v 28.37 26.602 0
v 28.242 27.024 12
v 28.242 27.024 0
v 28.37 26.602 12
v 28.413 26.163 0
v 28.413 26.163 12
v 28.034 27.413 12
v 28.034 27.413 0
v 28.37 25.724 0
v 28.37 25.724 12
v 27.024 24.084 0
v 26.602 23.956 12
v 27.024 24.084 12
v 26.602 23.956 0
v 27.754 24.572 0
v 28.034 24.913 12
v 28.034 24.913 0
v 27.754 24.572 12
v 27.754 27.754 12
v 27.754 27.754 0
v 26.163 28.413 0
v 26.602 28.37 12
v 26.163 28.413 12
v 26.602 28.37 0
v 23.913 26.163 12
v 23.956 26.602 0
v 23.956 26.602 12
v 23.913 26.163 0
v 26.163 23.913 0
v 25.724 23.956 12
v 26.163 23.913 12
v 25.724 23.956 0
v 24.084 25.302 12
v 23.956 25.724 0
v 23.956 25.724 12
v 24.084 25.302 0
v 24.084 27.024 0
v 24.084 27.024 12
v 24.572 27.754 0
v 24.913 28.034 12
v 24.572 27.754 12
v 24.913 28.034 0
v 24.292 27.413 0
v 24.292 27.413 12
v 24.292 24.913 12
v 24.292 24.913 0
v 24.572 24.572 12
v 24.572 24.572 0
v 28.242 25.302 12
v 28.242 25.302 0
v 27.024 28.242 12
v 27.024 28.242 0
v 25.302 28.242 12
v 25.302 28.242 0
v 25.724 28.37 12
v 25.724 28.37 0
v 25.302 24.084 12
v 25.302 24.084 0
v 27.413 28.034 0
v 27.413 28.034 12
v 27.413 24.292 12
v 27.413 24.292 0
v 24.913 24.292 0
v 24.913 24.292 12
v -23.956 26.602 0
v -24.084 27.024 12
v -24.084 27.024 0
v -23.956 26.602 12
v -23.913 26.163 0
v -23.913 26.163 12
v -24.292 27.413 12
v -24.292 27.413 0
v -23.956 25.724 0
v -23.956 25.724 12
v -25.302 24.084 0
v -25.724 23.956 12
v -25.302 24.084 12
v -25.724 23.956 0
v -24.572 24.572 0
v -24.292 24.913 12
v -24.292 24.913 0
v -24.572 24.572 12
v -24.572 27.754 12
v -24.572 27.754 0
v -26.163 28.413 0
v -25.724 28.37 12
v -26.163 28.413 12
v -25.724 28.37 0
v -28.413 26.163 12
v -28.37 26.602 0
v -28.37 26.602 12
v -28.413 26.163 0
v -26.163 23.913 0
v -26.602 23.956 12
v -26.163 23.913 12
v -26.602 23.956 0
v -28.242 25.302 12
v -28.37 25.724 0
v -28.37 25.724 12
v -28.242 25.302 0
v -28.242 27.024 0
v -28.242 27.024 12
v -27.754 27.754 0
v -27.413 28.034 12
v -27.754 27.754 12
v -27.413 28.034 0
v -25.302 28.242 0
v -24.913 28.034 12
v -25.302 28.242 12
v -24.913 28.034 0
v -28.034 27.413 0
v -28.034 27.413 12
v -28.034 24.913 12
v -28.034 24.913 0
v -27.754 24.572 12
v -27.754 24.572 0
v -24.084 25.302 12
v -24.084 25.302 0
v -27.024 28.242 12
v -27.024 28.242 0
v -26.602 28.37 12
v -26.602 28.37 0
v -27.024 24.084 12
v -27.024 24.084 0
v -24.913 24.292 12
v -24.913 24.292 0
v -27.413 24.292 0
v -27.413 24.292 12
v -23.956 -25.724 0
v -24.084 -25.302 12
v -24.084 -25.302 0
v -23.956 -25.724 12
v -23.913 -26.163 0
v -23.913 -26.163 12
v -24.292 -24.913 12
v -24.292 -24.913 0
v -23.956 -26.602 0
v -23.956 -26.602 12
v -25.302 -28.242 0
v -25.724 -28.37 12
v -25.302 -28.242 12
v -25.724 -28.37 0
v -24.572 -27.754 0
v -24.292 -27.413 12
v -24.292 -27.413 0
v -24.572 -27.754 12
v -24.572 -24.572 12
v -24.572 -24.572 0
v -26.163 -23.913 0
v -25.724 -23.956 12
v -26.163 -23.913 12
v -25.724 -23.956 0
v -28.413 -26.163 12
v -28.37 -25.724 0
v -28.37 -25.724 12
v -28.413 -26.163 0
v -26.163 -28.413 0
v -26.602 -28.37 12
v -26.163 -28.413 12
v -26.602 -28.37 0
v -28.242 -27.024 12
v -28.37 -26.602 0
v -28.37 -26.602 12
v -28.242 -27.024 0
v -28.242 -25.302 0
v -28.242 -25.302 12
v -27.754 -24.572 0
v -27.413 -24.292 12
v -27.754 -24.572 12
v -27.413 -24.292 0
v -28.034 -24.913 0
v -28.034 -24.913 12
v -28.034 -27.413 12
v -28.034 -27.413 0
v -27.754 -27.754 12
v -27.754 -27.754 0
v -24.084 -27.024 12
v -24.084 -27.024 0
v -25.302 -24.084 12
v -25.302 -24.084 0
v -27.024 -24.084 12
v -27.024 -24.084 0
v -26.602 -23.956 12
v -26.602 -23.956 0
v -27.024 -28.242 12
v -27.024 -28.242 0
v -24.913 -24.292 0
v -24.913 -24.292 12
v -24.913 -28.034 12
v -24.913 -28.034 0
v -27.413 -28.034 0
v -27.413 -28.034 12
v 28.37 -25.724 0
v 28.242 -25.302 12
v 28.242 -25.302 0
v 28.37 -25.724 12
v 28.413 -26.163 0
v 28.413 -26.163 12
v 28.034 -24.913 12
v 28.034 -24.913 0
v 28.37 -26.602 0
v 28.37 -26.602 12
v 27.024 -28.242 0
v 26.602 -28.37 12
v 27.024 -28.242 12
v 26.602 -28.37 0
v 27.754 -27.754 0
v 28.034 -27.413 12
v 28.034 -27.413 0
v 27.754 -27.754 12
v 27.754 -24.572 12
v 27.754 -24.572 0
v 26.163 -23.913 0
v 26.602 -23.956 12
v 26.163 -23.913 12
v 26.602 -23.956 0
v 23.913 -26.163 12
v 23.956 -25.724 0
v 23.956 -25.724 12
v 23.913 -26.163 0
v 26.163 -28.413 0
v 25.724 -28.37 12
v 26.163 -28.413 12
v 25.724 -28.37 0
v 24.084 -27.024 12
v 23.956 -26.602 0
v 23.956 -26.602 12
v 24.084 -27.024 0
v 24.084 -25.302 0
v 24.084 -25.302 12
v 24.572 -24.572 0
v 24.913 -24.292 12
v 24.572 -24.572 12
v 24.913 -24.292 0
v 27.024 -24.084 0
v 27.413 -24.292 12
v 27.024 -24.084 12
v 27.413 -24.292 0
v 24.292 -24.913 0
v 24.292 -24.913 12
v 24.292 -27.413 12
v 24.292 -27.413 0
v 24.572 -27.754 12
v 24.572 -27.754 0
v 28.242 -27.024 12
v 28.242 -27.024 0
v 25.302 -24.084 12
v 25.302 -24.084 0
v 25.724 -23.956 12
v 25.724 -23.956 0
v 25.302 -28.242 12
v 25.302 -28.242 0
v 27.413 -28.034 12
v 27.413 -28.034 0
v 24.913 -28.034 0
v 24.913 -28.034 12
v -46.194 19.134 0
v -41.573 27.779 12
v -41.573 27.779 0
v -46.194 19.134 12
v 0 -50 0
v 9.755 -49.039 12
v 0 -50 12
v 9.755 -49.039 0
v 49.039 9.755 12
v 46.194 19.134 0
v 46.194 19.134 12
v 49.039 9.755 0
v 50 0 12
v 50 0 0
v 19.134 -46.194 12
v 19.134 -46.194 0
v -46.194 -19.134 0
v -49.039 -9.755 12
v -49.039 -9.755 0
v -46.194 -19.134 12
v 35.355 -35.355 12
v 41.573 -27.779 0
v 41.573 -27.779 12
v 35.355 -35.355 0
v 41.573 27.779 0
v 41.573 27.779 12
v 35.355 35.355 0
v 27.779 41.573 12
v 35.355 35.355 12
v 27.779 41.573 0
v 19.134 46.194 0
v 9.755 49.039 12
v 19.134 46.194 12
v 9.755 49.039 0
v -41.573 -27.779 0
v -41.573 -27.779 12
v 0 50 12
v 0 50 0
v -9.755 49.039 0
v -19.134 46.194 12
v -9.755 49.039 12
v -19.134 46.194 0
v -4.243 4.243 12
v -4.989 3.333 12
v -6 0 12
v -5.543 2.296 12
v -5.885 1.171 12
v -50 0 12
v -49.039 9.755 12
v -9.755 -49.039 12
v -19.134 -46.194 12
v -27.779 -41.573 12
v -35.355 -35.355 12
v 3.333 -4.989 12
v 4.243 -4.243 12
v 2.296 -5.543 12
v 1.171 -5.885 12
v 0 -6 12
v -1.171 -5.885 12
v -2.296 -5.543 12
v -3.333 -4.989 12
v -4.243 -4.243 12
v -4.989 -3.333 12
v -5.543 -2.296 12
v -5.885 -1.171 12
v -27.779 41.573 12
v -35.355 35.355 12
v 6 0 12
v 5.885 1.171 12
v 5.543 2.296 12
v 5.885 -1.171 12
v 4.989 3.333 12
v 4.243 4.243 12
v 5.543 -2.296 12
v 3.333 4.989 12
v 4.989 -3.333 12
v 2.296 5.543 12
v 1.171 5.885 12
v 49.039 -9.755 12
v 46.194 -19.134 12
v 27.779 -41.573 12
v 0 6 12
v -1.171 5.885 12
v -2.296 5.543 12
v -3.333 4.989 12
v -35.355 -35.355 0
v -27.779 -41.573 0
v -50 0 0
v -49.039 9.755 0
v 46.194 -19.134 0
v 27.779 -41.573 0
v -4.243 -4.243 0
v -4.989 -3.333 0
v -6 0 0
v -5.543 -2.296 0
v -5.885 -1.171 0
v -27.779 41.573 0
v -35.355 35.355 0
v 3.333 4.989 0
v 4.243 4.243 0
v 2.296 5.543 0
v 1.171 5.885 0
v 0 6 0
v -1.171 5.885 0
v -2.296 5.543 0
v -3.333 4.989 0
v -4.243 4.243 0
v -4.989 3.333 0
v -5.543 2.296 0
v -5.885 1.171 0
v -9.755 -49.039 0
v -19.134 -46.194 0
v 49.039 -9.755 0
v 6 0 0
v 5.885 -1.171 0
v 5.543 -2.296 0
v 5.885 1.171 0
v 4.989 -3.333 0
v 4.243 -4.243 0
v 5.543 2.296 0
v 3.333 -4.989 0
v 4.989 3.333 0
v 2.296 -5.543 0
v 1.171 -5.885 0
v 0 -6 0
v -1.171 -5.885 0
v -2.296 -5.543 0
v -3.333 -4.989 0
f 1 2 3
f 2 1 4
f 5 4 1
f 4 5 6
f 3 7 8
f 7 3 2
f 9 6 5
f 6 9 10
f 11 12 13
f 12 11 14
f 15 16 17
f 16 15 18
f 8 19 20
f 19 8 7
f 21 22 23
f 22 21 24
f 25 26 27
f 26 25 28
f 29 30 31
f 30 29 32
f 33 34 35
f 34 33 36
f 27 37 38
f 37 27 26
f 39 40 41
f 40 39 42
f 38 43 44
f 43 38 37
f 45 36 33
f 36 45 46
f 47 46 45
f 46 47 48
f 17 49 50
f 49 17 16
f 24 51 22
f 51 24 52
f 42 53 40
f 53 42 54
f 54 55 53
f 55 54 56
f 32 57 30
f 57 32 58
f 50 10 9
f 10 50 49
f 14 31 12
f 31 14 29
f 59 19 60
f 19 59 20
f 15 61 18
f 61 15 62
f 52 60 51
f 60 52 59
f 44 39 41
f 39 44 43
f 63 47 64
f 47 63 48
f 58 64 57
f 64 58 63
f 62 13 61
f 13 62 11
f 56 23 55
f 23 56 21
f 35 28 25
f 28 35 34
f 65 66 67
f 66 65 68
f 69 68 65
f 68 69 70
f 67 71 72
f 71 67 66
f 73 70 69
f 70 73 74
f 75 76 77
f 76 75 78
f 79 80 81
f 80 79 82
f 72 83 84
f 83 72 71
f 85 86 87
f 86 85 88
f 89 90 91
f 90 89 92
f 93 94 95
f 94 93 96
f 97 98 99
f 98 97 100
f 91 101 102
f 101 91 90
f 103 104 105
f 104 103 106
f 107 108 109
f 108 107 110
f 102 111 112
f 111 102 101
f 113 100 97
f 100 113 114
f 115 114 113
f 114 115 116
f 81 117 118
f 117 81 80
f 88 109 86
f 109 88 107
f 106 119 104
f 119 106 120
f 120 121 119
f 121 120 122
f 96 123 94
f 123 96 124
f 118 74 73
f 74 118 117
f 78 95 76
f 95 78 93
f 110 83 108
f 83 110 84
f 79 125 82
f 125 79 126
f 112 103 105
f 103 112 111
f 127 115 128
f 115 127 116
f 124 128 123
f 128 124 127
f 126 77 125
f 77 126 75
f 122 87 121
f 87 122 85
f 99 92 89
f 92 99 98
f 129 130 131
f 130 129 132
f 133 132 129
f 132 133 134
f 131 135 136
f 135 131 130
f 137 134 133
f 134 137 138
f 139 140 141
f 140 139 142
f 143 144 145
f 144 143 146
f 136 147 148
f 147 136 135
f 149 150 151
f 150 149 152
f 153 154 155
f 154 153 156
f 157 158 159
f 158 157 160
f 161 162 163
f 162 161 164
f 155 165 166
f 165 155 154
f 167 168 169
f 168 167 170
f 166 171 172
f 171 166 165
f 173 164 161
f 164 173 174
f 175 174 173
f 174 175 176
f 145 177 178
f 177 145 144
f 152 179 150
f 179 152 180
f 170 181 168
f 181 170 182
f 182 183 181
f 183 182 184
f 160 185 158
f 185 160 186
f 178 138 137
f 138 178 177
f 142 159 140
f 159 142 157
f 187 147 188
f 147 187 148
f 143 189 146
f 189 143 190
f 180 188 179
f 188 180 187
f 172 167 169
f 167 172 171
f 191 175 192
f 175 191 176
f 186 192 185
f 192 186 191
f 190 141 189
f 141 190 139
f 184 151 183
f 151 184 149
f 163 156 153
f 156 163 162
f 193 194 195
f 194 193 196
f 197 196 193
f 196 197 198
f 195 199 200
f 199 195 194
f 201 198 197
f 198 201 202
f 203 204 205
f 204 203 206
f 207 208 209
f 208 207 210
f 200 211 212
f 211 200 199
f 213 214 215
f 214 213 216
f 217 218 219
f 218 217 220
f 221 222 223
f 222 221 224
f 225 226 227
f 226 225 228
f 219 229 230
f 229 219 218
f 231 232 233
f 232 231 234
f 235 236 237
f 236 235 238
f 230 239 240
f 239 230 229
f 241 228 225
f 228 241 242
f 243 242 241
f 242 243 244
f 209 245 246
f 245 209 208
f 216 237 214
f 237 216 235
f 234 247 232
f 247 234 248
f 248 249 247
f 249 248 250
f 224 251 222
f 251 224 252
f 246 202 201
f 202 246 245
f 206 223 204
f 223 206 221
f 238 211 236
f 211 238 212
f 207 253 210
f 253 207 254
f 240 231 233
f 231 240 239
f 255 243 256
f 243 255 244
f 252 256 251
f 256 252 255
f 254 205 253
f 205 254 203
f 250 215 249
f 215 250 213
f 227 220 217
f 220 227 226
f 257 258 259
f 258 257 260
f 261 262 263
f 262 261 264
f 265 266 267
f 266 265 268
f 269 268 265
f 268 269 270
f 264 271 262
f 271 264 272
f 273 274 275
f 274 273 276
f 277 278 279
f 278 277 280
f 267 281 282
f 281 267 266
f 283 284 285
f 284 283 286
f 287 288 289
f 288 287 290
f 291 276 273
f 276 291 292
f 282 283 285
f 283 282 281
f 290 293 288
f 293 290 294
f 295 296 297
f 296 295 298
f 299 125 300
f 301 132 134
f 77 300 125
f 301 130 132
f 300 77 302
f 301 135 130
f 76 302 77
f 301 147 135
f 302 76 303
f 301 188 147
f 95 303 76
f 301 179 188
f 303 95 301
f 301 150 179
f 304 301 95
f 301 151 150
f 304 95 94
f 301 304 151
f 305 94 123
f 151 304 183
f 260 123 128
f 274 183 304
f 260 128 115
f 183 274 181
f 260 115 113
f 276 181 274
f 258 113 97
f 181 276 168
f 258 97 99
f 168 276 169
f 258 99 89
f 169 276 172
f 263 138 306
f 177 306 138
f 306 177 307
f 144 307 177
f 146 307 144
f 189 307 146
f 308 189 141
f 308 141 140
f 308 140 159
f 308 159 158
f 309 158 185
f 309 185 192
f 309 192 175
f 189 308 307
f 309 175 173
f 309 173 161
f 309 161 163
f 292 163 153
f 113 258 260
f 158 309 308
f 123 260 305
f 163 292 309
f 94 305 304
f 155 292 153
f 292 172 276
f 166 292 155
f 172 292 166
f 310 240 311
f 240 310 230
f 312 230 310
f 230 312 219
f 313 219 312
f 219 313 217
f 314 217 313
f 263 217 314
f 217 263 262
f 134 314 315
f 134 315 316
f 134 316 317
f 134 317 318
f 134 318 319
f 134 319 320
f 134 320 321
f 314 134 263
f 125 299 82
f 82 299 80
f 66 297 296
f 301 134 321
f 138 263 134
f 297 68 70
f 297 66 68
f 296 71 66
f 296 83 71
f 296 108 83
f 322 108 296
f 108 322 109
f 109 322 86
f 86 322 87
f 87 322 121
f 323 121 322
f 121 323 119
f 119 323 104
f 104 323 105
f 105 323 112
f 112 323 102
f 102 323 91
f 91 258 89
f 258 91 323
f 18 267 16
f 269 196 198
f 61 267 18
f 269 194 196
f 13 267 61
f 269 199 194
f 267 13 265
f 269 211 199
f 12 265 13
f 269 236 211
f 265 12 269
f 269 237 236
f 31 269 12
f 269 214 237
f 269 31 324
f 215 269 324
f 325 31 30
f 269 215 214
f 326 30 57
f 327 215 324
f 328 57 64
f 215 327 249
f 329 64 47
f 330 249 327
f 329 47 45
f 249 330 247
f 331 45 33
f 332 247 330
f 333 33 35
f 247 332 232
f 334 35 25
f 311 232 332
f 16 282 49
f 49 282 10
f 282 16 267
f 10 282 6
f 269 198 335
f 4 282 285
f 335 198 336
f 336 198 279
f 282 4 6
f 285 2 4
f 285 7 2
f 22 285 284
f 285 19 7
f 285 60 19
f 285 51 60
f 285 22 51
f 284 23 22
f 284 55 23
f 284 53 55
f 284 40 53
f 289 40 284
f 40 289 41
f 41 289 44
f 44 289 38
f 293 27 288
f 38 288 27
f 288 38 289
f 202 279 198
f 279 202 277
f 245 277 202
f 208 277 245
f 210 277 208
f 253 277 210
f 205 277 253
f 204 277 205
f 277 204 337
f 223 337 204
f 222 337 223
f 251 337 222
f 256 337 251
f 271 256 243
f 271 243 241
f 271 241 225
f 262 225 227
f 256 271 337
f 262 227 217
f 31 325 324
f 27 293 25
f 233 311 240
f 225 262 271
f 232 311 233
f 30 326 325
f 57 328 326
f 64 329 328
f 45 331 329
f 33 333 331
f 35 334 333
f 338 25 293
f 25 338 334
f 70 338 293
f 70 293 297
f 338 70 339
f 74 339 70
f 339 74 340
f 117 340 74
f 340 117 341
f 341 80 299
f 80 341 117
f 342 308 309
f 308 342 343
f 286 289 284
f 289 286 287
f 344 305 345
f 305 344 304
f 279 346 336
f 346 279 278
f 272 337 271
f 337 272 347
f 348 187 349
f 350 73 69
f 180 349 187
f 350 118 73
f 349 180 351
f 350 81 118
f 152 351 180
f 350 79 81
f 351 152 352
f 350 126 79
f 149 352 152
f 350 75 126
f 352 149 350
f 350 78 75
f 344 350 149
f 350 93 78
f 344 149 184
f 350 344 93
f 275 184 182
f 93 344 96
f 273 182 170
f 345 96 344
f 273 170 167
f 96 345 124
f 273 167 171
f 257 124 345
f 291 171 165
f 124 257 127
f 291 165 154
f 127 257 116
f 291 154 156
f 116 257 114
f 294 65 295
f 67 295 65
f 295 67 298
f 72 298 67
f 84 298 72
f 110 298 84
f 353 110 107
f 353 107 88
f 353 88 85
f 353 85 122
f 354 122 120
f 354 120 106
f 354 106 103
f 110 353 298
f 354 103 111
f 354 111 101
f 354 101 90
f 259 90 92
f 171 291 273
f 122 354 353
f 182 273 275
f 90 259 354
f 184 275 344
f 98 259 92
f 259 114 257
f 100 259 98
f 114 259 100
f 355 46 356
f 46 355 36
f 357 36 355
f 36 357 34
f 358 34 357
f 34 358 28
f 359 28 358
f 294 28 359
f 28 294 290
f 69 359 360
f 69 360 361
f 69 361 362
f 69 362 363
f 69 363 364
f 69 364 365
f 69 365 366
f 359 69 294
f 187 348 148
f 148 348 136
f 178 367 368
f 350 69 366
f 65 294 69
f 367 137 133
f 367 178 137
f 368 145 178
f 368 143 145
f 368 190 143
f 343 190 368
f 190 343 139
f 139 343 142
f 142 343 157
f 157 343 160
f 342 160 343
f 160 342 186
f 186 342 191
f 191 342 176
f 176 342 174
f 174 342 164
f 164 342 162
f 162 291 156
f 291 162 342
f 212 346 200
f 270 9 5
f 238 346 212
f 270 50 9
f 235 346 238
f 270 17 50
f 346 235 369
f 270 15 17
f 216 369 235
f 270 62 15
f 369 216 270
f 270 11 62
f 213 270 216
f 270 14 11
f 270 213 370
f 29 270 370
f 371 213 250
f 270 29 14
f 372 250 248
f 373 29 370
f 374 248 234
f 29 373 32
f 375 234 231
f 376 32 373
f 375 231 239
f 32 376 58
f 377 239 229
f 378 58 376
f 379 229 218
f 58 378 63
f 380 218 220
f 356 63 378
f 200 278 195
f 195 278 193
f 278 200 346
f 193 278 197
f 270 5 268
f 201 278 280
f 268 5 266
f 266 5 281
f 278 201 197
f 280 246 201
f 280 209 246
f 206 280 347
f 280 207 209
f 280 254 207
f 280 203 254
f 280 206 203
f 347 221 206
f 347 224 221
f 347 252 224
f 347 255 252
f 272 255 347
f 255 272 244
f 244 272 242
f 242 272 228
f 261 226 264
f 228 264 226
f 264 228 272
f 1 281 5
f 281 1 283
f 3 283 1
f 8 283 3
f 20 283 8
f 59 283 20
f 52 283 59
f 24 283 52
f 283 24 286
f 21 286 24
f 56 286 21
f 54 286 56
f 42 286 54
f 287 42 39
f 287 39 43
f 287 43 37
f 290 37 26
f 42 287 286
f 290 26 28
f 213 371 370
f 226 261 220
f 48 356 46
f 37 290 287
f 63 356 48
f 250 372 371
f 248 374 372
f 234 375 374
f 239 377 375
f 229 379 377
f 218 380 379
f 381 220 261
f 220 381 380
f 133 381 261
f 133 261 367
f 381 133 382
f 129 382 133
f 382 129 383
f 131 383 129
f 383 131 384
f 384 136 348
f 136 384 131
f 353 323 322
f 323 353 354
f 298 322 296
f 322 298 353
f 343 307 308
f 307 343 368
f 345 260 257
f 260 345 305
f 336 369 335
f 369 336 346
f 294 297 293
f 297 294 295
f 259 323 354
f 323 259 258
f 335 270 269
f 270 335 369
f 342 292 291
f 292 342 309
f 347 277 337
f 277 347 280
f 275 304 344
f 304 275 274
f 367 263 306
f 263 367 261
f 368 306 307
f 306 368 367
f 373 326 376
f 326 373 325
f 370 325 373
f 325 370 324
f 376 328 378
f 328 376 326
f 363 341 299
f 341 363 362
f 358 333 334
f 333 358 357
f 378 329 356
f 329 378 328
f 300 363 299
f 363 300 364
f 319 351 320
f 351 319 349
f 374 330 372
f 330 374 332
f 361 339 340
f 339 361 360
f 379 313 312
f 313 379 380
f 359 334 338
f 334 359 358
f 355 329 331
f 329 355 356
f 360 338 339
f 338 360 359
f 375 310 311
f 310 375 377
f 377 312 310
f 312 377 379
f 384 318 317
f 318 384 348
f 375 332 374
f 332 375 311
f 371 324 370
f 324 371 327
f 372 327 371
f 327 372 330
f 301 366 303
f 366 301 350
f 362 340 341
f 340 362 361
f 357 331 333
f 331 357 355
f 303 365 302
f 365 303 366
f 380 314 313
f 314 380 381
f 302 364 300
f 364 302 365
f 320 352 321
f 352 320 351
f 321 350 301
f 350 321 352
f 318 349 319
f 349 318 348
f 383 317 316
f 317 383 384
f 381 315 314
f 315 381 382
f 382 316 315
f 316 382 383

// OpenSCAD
$fn = 32;

// ----------------------------------------------------------------------
// Flange Ø100 x 12
// 4 holes on a Ø74 bolt circle, bolted joints
// ----------------------------------------------------------------------

// --- parameters (mm) ---
flange_d = 100;  // outside diameter of the flange
thickness = 12;  // flange thickness
holes = 4;       // number of bolt holes
pcd = 74;        // bolt circle diameter
start_deg = 45;  // angle of the first hole, from +X
hole_d = 4.5;    // bolt hole diameter
bore_d = 12;     // central through bore
hub_d = 24;      // hub outside diameter
hub_h = 0;       // hub height above the flange face (0 = no hub)

// --- derived feature positions (mm) ---
height = thickness + hub_h;  // = 12   overall height of the part
pcd_r = pcd / 2;             // = 37   bolt circle radius
hole_step = 360 / holes;     // = 90   angular pitch
feature_centers = [
  [pcd_r * cos(start_deg + 0 * hole_step), pcd_r * sin(start_deg + 0 * hole_step)],
  [pcd_r * cos(start_deg + 1 * hole_step), pcd_r * sin(start_deg + 1 * hole_step)],
  [pcd_r * cos(start_deg + 2 * hole_step), pcd_r * sin(start_deg + 2 * hole_step)],
  [pcd_r * cos(start_deg + 3 * hole_step), pcd_r * sin(start_deg + 3 * hole_step)]
];   // bolt hole centres on the pitch circle

// flange disc, every hole and the bore cut straight through
difference() {
  union() {
    cylinder(d = flange_d, h = thickness);
  }
  translate([0, 0, -1]) cylinder(d = bore_d, h = height + 2);  // bore, through
  for (centre = feature_centers)
    translate([centre[0], centre[1], -1]) cylinder(d = hole_d, h = thickness + 2);
}
